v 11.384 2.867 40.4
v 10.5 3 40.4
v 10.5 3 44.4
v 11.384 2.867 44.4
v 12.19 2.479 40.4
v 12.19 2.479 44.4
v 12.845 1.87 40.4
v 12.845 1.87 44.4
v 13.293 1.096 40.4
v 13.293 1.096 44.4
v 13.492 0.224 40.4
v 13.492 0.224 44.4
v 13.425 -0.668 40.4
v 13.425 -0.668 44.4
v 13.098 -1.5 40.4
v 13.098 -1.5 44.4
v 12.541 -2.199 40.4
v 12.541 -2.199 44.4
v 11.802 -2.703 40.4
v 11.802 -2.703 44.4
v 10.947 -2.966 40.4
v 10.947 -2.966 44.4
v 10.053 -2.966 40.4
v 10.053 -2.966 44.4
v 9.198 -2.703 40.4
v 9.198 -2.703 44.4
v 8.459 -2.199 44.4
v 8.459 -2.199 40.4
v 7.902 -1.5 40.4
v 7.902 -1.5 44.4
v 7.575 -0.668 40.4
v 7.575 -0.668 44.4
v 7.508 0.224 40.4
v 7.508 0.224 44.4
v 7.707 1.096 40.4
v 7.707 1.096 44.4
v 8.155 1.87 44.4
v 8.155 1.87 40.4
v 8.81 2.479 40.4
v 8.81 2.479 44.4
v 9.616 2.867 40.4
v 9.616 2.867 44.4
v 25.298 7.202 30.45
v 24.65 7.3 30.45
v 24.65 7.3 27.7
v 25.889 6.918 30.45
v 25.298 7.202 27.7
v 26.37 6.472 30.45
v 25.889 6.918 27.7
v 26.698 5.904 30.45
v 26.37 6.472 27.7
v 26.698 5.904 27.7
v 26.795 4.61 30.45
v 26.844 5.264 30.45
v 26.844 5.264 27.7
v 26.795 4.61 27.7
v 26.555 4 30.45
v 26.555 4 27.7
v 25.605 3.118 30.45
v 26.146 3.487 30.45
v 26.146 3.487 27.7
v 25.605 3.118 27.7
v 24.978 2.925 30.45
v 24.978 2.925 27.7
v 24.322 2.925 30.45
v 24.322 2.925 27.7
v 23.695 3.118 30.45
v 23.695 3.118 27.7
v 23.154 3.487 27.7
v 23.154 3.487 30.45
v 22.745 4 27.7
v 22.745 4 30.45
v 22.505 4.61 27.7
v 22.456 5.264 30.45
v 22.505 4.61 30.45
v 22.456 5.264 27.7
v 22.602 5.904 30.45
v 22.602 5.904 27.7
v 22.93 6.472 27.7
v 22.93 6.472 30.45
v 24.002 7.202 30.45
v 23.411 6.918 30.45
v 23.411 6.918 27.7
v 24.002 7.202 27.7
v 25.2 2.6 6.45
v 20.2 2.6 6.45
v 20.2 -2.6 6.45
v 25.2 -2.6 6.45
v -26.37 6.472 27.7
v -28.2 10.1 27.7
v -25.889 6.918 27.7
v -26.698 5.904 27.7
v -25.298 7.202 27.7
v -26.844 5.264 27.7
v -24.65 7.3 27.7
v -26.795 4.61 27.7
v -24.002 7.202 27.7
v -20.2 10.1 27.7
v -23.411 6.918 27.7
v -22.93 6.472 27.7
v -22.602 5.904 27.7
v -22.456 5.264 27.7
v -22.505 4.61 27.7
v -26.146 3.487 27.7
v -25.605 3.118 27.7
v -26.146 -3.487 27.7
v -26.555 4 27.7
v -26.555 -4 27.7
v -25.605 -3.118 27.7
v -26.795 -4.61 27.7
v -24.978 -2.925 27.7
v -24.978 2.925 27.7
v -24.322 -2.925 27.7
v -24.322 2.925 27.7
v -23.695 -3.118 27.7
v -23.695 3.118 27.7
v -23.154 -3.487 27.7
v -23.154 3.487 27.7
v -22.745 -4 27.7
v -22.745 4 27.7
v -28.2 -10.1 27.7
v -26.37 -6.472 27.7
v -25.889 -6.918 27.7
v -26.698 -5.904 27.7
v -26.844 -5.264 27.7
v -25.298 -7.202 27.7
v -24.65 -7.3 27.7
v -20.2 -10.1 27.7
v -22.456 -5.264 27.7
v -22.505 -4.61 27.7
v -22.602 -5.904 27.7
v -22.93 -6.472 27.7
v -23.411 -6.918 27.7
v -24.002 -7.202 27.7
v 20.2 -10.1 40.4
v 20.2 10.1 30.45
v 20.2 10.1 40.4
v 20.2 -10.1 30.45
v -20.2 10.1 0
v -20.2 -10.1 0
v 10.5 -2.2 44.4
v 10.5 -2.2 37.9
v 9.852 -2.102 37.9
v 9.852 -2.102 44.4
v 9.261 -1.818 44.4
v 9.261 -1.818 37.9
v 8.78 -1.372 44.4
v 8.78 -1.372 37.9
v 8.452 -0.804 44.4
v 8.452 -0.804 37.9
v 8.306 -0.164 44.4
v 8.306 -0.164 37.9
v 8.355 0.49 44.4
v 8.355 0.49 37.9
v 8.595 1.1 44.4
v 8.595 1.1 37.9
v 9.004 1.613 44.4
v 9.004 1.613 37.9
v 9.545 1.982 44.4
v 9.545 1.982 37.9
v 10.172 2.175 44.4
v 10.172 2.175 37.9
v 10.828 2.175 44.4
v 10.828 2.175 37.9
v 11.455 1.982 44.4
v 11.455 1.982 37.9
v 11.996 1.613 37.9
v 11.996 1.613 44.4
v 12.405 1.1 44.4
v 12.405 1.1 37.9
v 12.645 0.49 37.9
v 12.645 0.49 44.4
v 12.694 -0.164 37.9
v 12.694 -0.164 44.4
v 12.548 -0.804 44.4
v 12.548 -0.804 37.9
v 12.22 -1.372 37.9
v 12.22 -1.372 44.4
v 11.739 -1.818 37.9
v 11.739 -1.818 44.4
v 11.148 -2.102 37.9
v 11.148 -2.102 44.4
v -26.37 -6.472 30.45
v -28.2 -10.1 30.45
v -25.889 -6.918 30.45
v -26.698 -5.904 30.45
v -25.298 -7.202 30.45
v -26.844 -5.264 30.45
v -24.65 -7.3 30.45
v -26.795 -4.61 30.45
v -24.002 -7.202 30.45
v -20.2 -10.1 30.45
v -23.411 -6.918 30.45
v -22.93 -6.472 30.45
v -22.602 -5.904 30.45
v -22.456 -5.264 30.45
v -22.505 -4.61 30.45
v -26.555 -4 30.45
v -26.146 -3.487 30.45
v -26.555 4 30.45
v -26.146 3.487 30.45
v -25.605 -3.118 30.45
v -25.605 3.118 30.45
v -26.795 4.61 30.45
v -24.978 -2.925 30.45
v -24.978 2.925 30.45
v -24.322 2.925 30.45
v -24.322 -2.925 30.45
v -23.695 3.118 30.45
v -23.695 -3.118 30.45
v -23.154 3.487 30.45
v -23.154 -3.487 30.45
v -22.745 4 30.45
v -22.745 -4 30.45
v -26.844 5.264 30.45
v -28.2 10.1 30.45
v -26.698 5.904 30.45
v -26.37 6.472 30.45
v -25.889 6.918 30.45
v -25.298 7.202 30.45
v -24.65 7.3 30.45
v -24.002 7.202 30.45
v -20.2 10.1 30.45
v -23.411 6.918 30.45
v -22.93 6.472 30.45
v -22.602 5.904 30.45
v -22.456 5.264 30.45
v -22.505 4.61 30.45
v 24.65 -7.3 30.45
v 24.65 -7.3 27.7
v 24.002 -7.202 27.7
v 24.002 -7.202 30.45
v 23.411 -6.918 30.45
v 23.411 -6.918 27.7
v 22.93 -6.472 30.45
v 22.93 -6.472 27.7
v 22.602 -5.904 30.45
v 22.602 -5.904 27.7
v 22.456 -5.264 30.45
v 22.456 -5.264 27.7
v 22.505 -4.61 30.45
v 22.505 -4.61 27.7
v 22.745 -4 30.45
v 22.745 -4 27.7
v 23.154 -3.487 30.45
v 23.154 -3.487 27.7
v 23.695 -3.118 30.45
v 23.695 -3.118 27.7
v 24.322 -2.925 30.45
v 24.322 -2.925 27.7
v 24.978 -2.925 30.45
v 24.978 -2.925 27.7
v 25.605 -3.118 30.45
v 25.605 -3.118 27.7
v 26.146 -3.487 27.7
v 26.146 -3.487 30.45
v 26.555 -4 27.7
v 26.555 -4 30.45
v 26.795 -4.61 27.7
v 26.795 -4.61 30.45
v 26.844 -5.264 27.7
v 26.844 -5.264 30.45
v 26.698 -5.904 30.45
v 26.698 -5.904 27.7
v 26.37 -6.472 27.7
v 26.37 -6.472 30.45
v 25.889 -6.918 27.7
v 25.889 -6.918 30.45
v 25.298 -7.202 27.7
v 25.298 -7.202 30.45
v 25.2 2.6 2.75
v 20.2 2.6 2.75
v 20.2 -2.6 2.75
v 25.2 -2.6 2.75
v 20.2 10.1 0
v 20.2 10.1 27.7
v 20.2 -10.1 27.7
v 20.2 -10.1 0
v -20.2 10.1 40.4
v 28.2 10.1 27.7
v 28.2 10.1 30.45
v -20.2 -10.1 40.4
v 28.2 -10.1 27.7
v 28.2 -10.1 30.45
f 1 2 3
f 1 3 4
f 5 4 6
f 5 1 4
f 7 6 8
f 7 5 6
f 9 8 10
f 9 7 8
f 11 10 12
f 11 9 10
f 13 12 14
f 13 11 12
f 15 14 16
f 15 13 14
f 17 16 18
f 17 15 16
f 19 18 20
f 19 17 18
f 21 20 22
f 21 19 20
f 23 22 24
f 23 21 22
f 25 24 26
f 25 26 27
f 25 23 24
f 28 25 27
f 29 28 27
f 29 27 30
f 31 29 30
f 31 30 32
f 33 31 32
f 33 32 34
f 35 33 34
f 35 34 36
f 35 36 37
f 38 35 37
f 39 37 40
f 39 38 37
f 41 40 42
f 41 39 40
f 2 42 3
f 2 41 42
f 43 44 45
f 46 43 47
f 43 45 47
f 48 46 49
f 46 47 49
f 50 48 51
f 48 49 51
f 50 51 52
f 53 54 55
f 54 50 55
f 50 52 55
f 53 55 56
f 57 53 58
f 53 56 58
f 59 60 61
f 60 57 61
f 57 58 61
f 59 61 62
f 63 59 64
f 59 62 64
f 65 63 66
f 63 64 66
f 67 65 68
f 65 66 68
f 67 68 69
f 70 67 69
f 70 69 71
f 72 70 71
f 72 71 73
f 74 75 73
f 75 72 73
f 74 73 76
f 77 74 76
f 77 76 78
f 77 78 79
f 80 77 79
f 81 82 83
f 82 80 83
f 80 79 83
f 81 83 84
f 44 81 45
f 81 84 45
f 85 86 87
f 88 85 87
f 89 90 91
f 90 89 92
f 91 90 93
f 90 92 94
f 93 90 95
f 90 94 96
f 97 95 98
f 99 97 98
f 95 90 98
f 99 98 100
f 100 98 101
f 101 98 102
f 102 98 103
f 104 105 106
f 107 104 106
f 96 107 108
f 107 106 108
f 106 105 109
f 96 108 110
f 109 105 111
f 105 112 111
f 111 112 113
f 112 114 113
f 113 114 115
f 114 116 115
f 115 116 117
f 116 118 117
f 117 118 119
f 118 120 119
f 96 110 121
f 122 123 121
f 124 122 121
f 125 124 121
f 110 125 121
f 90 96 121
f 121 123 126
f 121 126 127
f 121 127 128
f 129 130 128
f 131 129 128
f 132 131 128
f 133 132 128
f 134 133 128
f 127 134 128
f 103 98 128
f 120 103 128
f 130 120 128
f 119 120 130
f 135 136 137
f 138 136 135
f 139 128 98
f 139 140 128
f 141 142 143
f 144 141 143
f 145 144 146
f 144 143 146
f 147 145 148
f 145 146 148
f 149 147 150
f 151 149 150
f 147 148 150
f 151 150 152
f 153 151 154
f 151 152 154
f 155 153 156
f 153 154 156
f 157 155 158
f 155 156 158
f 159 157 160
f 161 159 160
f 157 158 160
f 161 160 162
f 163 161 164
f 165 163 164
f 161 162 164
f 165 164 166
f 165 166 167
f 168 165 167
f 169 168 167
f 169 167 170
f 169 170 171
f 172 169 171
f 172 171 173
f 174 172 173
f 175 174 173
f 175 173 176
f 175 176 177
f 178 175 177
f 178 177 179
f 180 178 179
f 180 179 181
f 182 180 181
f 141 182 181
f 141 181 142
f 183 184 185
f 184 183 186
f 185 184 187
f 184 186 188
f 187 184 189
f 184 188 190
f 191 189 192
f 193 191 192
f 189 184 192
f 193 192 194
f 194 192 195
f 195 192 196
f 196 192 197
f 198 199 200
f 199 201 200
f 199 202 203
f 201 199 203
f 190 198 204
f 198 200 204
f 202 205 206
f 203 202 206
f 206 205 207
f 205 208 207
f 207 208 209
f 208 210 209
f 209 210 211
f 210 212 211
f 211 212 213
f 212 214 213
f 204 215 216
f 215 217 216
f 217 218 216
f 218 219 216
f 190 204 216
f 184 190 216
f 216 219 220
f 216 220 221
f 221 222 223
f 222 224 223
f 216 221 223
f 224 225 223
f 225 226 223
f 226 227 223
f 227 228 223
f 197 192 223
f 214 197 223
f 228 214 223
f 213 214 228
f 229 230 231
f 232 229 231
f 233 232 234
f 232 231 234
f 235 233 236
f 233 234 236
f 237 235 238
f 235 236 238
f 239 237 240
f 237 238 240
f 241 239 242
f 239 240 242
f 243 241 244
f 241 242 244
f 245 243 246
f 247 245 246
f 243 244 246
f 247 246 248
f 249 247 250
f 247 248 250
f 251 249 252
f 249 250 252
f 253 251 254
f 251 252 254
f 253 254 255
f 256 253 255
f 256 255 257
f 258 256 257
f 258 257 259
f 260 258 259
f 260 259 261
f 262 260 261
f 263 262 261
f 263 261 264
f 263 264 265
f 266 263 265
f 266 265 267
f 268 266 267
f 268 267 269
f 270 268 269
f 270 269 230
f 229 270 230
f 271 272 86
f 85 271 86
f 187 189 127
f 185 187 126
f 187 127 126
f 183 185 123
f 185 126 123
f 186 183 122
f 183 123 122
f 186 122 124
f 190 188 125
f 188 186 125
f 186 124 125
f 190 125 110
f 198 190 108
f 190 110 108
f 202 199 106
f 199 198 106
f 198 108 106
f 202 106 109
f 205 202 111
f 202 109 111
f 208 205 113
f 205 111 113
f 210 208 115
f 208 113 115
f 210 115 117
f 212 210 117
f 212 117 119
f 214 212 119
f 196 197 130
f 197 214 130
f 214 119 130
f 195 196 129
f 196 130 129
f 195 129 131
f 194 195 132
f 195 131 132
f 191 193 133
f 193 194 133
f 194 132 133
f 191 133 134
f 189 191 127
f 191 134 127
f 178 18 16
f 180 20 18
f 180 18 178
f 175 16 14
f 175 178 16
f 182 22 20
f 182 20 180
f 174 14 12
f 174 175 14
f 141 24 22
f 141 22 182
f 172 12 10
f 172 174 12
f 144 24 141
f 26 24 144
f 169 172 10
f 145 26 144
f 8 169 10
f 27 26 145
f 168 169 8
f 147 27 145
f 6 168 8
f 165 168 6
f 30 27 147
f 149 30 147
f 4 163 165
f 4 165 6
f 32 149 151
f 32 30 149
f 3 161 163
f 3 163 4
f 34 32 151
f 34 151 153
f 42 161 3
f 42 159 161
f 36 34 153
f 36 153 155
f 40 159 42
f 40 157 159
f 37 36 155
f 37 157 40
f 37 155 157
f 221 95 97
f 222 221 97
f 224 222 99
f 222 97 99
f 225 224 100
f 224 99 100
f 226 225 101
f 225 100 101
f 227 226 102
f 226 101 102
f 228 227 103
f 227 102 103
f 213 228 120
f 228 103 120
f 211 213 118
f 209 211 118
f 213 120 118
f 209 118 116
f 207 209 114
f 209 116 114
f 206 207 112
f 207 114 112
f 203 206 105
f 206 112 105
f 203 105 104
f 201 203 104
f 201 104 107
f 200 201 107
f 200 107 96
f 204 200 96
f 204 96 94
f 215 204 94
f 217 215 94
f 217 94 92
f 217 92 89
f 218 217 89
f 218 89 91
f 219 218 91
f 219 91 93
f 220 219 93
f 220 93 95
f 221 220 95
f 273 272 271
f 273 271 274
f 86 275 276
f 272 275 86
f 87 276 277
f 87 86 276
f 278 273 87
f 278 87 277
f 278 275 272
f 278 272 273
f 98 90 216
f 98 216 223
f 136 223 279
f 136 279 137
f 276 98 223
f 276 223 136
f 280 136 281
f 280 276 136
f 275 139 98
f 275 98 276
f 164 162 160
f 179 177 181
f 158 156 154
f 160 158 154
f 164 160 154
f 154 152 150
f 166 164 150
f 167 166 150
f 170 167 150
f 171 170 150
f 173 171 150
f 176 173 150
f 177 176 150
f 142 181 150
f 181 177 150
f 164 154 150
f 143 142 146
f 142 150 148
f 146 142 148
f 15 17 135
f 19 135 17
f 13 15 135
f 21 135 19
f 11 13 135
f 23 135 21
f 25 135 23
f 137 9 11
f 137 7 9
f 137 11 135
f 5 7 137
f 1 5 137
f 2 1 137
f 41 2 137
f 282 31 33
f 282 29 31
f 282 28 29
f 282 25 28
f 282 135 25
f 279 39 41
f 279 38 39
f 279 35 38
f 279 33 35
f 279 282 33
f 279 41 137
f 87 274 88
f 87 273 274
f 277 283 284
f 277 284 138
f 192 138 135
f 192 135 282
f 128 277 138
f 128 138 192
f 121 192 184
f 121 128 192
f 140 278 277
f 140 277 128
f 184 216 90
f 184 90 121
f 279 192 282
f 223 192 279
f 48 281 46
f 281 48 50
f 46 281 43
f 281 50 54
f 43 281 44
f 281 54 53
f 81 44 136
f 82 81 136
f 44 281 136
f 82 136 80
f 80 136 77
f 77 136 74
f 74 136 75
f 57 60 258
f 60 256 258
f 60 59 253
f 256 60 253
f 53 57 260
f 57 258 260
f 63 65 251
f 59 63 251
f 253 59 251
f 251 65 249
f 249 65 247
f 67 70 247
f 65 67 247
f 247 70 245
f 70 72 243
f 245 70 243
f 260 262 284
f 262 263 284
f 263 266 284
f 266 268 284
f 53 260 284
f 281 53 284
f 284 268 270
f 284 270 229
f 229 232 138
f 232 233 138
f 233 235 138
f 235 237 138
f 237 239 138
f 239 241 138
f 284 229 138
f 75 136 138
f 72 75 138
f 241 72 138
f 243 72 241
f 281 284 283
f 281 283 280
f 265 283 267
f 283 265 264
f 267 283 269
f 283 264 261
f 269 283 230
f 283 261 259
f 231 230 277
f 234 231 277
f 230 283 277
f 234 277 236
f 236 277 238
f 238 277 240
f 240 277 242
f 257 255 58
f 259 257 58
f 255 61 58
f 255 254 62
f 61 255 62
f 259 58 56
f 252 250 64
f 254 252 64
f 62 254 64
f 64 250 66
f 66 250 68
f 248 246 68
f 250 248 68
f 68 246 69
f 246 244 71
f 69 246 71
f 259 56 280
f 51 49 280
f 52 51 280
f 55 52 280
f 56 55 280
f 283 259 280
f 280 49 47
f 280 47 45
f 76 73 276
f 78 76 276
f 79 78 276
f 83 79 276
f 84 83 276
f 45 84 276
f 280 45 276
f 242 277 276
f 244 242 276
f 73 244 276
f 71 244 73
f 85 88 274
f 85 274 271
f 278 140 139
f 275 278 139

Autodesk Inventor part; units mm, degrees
ref_plane "Plano de trabajo1" through (-110.1, 7.287, 0) normal (0, 0, 1) x (0, 1, 0)
sketch "Boceto1" plane through (-110.1, 7.287, 0) normal (0, 0, 1) x (0, 1, 0)
  line L0 (-17.387, -89.9) -> (2.813, -89.9)
  line L1 (2.813, -89.9) -> (2.813, -130.3)
  line L2 (2.813, -130.3) -> (-17.387, -130.3)
  line L3 (-17.387, -130.3) -> (-17.387, -89.9)
  line L4 (-17.387, -89.9) -> (2.813, -130.3) construction
  line L5 (2.813, -89.9) -> (-17.387, -130.3) construction
  point P0 (-7.287, -110.1)
  dimension "d0" = 20.2
  dimension "d1" = 40.4
extrude "Extrusión1" add sketch "Boceto1" along normal blind 40.4
sketch "Boceto2" plane through (20.2, -10.1, 0) normal (1, 0, 0) x (0, 1, 0)
  line L0 (0, 0) -> (20.2, 0) projected
  line L1 (20.2, 0) -> (20.2, 40.4) projected
  line L2 (0, 40.4) -> (20.2, 40.4) projected
  line L3 (0, 0) -> (0, 40.4) projected
  line L4 (20.2, 0) -> (0, 0) projected
  line L5 (0, 0) -> (0, 27.7)
  line L6 (0, 27.7) -> (20.2, 27.7)
  line L7 (0, 27.7) -> (20.2, 27.7)
  line L8 (20.2, 27.7) -> (20.2, 30.45)
  line L9 (20.2, 30.45) -> (0, 30.45)
  line L10 (0, 30.45) -> (0, 27.7)
  point P0 (10.1, 0)
  dimension "d4" = 27.7
  dimension "d5" = 2.75
extrude "Extrusión2" add sketch "Boceto2" along normal blind 8 contours L3 L9 L1 L6
sketch "Boceto3" plane through (20.2, -10.1, 30.45) normal (0, 0, 1) x (0, 1, 0)
  line L0 (0, -8) -> (20.2, -8) projected
  line L1 (0, -8) -> (0, -2.25)
  line L2 (0, 0) -> (0, -8) projected
  line L3 (0, -2.25) -> (20.2, -2.25)
  line L4 (0, 0) -> (20.2, 0) projected
  line L5 (0, 0) -> (0, -8) projected
  line L6 (20.2, -8) -> (0, -8) projected
  line L7 (20.2, 0) -> (20.2, -8) projected
  line L8 (0, -2.25) -> (2.8, -2.25)
  line L9 (0, -2.25) -> (2.8, -2.25) construction
  line L10 (2.8, -2.25) -> (2.8, -8)
  line L11 (20.2, -8) -> (0, -8) projected
  circle A0 centre (5, -4.45) radius 2.2
  point P0 (10.1, 20.2)
  dimension "d8" = 5.75
  dimension "d9" = 2.8
  dimension "d10" = 0
  dimension "d11" = 90
  dimension "d12" = 4.4
hole "Agujero1" at (24.65, -5.1, 30.45) direction (0, 0, -1) diameter 4.4 end through all
ref_plane "Plano de trabajo2" through (20.2, 0, 0) normal (0, 1, 0) x (0, 0, -1)
mirror "Simetría1" about plane through (20.2, 0, 0) normal (0, 1, 0) of "Agujero1"
ref_plane "Plano de trabajo3" through (0, -10.1, 0) normal (1, 0, 0) x (0, 1, 0)
mirror "Simetría2" about plane through (0, -10.1, 0) normal (1, 0, 0) of "Extrusión2", "Agujero1", "Simetría1"
sketch "Boceto4" plane through (-110.1, 7.287, 40.4) normal (0, 0, 1) x (0, 1, 0)
  line L0 (-17.387, -130.3) -> (2.813, -130.3) projected
  line L1 (2.813, -130.3) -> (2.813, -89.9) projected
  line L2 (2.813, -89.9) -> (-17.387, -89.9) projected
  line L3 (-17.387, -89.9) -> (-17.387, -130.3) projected
  line L4 (-17.387, -130.3) -> (2.813, -130.3) projected
  line L5 (-7.287, -130.3) -> (-7.287, -123.6)
  line L6 (-7.287, -123.6) -> (-7.287, -117.6)
  circle A0 centre (-7.287, -120.6) radius 3
  point P0 (-7.287, -110.1)
  dimension "d20" = 6.7
  dimension "d21" = 6
extrude "Extrusión3" add sketch "Boceto4" along normal blind 4 contours A0 L6 | L6 A0
sketch "Boceto5" plane through (10.5, 0, 44.4) normal (0, 0, 1) x (1, 0, 0)
  circle A0 centre (0, 0) radius 3 projected
  point P0 (-10.5, 0)
hole "Agujero2" at (10.5, 0, 44.4) direction (0, 0, -1) diameter 4.4 depth 6.5
sketch "Boceto6" plane through (20.2, -10.1, 0) normal (1, 0, 0) x (0, 1, 0)
  line L0 (20.2, 0) -> (20.2, 27.7) projected
  line L1 (0, 0) -> (20.2, 0)
  line L2 (20.2, 0) -> (20.2, 6.45)
  line L3 (20.2, 6.45) -> (0, 6.45)
  line L4 (0, 6.45) -> (0, 0)
  line L5 (0, 0) -> (20, 0)
  line L6 (20, 0) -> (20, 2.75)
  line L7 (20, 2.75) -> (0, 2.75)
  line L8 (0, 2.75) -> (0, 0)
  line L9 (0, 2.75) -> (7.5, 2.75)
  line L10 (7.5, 2.75) -> (7.5, 6.45)
  line L11 (20.2, 6.45) -> (12.7, 6.45)
  line L12 (7.5, 2.75) -> (12.7, 2.75)
  line L13 (12.7, 2.75) -> (12.7, 6.45)
  line L14 (12.7, 6.45) -> (7.5, 6.45)
  line L15 (7.5, 6.45) -> (7.5, 2.75)
  point P0 (10.1, 0)
  dimension "d31" = 6.45
  dimension "d32" = 2.75
  dimension "d33" = 7.5
  dimension "d34" = 7.5
extrude "Extrusión4" add sketch "Boceto6" along normal blind 5 contours L13 L7 L10 L3
properties part number "Servomotor"
